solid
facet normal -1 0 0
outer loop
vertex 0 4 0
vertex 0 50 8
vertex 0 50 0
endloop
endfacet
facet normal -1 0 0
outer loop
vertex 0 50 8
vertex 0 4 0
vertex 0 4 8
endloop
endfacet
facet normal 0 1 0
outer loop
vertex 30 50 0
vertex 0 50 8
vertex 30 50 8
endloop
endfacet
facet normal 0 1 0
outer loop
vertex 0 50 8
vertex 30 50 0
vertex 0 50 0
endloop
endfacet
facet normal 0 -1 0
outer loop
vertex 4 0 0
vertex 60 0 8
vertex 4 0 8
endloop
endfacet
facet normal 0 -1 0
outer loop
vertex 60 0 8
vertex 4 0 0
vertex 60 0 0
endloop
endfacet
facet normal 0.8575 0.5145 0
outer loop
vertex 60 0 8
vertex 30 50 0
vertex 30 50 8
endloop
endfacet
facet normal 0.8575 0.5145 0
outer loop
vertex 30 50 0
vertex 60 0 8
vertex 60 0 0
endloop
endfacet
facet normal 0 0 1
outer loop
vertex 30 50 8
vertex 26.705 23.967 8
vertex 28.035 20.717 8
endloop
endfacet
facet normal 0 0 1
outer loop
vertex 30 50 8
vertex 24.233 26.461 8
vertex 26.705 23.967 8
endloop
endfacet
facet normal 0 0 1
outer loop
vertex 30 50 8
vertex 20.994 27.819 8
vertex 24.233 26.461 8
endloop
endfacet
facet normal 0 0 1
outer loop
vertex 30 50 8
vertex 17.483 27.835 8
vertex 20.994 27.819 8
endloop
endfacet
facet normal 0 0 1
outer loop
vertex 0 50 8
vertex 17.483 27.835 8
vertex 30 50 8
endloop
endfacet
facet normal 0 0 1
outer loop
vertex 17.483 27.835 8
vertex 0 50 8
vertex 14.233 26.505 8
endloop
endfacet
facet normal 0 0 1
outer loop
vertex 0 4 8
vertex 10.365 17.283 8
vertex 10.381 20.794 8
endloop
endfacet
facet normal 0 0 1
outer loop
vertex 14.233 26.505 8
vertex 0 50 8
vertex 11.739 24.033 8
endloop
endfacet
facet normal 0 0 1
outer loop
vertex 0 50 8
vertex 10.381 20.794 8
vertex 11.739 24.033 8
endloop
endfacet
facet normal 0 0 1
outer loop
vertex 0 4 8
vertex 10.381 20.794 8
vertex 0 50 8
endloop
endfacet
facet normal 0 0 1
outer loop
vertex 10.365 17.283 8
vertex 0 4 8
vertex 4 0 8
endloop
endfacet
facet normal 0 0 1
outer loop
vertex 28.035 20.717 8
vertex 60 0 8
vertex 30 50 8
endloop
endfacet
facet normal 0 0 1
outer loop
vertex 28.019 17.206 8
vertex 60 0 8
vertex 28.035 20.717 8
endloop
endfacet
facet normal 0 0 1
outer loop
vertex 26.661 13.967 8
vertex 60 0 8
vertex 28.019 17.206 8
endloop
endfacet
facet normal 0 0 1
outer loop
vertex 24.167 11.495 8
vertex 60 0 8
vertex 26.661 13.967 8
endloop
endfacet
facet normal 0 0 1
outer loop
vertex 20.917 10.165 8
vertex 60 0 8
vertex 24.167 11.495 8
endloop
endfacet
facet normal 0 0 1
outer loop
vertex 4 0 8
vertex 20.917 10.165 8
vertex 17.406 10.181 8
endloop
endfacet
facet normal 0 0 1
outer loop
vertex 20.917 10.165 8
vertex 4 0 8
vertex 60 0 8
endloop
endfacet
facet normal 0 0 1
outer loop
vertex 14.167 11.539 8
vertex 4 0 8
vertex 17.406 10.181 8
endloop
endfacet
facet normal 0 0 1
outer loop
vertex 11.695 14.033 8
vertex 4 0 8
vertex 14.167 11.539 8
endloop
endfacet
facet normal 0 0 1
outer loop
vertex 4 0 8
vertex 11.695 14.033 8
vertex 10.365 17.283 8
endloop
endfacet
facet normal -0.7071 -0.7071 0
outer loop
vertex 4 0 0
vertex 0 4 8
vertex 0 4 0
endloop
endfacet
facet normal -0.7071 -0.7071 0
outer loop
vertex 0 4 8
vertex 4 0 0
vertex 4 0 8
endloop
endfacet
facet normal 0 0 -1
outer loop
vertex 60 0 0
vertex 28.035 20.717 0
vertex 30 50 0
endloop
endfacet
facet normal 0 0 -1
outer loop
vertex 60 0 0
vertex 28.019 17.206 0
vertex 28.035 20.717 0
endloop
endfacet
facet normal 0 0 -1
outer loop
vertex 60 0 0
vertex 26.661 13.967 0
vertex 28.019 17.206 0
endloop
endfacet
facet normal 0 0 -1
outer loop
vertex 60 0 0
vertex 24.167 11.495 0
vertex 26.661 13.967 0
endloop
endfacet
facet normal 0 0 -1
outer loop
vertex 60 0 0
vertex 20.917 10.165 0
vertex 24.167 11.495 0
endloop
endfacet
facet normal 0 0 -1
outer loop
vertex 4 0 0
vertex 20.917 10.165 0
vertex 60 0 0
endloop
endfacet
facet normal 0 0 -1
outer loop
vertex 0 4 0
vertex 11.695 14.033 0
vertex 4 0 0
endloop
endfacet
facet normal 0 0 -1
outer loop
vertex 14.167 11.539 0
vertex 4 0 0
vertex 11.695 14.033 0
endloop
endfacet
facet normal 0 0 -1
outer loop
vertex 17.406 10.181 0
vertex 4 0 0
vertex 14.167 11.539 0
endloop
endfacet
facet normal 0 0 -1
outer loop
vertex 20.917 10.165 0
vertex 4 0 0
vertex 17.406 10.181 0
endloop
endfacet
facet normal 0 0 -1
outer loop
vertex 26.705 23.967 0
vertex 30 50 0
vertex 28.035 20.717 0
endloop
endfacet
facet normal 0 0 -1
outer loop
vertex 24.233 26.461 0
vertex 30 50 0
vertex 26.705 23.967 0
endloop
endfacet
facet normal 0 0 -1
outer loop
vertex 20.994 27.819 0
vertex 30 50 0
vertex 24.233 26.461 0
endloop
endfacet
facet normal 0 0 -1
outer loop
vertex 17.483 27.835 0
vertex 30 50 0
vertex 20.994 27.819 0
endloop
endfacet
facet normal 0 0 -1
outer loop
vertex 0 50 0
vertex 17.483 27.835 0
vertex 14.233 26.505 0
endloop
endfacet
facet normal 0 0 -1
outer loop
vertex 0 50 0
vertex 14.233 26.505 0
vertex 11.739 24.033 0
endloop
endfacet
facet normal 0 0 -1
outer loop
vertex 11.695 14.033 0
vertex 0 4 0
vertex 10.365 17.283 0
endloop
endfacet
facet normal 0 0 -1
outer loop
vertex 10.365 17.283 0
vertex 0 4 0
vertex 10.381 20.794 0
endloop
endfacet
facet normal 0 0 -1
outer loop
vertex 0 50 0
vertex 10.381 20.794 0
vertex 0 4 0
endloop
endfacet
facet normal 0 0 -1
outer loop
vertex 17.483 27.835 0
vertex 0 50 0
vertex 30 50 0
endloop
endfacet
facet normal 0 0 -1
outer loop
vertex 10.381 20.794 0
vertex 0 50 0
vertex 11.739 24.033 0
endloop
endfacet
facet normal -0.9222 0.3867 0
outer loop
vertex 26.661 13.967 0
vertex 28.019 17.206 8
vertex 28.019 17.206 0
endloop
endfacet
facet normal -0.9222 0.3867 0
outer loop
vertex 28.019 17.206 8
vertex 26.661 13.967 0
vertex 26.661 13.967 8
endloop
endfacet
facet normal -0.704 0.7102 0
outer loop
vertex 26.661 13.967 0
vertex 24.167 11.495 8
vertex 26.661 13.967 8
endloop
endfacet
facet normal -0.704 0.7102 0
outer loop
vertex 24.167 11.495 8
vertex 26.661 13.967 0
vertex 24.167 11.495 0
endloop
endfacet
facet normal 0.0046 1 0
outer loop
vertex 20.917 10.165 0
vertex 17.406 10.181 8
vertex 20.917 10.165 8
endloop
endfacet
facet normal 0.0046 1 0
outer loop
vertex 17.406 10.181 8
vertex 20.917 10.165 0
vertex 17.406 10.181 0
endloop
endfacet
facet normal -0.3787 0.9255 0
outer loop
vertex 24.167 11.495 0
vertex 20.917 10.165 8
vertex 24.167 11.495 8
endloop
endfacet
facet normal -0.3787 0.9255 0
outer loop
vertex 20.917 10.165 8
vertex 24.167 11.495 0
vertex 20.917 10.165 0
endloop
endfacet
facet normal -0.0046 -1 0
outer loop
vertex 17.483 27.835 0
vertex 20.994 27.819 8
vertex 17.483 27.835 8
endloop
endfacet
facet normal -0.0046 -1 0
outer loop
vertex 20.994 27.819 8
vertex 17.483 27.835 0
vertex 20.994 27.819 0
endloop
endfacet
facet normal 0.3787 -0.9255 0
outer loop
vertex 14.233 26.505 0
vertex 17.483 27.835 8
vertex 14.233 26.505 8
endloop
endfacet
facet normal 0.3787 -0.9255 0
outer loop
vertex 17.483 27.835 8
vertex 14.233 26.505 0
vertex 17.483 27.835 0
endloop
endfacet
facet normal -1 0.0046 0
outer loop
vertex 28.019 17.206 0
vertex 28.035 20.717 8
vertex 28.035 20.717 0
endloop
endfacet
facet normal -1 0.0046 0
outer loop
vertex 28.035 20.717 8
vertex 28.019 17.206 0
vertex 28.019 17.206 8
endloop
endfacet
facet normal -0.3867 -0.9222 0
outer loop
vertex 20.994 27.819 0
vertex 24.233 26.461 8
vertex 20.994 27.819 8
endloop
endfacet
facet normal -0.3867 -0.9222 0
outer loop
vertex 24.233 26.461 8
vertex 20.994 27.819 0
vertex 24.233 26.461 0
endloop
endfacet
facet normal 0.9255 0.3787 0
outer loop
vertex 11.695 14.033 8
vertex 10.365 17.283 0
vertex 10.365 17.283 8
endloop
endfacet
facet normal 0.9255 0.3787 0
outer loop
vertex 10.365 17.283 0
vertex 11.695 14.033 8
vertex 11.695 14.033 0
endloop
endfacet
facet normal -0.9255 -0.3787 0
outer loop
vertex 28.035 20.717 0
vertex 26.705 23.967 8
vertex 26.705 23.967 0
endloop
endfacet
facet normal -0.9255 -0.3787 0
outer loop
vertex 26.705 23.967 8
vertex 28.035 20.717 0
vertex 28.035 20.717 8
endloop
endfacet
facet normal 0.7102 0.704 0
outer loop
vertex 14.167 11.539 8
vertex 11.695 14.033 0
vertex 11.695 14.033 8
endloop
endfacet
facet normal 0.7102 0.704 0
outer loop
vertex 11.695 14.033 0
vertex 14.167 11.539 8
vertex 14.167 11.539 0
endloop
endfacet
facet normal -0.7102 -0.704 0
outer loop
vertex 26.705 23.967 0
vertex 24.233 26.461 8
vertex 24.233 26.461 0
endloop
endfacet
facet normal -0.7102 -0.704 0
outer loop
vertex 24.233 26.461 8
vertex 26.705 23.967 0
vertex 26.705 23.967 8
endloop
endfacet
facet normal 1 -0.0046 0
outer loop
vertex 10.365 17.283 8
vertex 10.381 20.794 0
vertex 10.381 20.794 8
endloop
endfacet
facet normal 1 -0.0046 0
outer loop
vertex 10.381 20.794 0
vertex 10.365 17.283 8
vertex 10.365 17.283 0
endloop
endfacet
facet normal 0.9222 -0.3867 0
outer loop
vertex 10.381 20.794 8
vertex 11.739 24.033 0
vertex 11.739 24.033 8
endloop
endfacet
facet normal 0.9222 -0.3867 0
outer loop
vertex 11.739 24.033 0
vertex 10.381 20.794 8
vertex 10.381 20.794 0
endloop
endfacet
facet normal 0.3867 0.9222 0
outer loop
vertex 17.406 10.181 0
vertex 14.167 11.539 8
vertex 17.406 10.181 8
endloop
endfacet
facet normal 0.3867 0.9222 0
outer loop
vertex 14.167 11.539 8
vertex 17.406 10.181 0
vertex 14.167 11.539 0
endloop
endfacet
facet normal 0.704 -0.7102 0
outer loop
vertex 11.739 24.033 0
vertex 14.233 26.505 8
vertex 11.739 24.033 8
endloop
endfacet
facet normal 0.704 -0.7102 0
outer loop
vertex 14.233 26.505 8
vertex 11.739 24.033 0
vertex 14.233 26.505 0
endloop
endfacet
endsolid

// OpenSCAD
$fn = 32;

// ----------------------------------------------------------------------
// Bracket plate: gusset 60 x 50
// ----------------------------------------------------------------------

// --- parameters (mm) ---
hole_r = 3;               // bolt hole radius
plate_t = 8;              // plate thickness, Z (extrusion height)
gus_a = 60;               // base length
gus_b = 50;               // height
top_x = 30;               // top edge X of the angled cut
light_r = 9;              // lightening hole radius

light_d = 2 * light_r;

profile = [[4, 0], [30, 0], [60, 0], [30, 50], [0, 50], [0, 4]];  // primary outline, 6 points, counter clockwise
void_1 = [[28.035, 20.717], [26.705, 23.967], [24.233, 26.461], [20.994, 27.819], [17.483, 27.835], [14.233, 26.505], [11.739, 24.033], [10.381, 20.794], [10.365, 17.283], [11.695, 14.033], [14.167, 11.539], [17.406, 10.181], [20.917, 10.165], [24.167, 11.495], [26.661, 13.967], [28.019, 17.206]];  // lightening hole, 16 points

// --- the one profile operation ---
difference() {
  linear_extrude(height = plate_t) polygon(points = profile);
  translate([0, 0, -1])
    linear_extrude(height = plate_t + 2) polygon(points = void_1);
}
